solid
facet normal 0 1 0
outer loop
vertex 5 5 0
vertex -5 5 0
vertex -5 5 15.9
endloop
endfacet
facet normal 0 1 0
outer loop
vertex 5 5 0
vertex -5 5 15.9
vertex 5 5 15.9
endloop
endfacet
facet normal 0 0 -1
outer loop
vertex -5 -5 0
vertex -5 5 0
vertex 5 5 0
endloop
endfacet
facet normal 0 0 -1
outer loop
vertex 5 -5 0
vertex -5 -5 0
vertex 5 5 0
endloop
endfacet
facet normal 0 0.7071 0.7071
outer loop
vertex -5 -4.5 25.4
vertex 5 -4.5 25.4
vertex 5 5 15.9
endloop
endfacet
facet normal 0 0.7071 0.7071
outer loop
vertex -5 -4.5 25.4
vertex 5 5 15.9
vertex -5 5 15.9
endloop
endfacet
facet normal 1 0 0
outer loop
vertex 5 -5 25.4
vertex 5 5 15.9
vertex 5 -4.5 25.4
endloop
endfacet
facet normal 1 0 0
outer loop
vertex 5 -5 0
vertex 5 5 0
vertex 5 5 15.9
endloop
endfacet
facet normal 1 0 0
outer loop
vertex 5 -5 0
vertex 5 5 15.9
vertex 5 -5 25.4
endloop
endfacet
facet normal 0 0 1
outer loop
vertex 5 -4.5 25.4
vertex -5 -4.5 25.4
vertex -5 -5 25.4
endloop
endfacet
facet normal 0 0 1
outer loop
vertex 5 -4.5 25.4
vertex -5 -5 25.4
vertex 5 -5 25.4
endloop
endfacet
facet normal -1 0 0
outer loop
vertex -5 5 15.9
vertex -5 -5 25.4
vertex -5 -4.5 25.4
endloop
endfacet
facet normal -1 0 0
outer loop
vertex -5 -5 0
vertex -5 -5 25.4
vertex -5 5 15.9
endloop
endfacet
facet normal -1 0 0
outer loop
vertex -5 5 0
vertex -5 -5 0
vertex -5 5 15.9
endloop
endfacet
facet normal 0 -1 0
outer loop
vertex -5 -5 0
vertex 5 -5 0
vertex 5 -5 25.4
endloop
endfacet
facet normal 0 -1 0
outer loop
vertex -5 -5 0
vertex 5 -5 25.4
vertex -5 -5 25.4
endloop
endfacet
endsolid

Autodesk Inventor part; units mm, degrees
ref_plane "YZ Plane" through (0, 0, 0) normal (1, 0, 0) x (0, 1, 0)
ref_plane "XZ Plane" through (0, 0, 0) normal (0, 1, 0) x (-1, 0, 0)
ref_plane "XY Plane" through (0, 0, 0) normal (0, 0, 1) x (1, 0, 0)
sketch "Sketch1" plane through (0, 0, 0) normal (0, 0, 1) x (1, 0, 0)
  line L0 (0, 7) -> (0, -7) projected
  line L1 (-7, 0) -> (7, 0) projected
  line L2 (5, -5) -> (-5, -5)
  line L3 (-5, -5) -> (-5, 5)
  line L4 (-5, 5) -> (5, 5)
  line L5 (5, 5) -> (5, -5)
  line L6 (5, -5) -> (-5, 5) construction
  line L7 (-5, -5) -> (5, 5) construction
  point P0 (0, 0)
  dimension "d0" = 10
  dimension "d1" = 10
extrude "Extrusion1" add sketch "Sketch1" along normal blind 25.4
chamfer "Chamfer1" distance 9.5 angle 45 1 edges at (0, 5, 25.4)
properties part number "ADAFRUIT 1512 LOCK SOLENOID PLUNGER"
